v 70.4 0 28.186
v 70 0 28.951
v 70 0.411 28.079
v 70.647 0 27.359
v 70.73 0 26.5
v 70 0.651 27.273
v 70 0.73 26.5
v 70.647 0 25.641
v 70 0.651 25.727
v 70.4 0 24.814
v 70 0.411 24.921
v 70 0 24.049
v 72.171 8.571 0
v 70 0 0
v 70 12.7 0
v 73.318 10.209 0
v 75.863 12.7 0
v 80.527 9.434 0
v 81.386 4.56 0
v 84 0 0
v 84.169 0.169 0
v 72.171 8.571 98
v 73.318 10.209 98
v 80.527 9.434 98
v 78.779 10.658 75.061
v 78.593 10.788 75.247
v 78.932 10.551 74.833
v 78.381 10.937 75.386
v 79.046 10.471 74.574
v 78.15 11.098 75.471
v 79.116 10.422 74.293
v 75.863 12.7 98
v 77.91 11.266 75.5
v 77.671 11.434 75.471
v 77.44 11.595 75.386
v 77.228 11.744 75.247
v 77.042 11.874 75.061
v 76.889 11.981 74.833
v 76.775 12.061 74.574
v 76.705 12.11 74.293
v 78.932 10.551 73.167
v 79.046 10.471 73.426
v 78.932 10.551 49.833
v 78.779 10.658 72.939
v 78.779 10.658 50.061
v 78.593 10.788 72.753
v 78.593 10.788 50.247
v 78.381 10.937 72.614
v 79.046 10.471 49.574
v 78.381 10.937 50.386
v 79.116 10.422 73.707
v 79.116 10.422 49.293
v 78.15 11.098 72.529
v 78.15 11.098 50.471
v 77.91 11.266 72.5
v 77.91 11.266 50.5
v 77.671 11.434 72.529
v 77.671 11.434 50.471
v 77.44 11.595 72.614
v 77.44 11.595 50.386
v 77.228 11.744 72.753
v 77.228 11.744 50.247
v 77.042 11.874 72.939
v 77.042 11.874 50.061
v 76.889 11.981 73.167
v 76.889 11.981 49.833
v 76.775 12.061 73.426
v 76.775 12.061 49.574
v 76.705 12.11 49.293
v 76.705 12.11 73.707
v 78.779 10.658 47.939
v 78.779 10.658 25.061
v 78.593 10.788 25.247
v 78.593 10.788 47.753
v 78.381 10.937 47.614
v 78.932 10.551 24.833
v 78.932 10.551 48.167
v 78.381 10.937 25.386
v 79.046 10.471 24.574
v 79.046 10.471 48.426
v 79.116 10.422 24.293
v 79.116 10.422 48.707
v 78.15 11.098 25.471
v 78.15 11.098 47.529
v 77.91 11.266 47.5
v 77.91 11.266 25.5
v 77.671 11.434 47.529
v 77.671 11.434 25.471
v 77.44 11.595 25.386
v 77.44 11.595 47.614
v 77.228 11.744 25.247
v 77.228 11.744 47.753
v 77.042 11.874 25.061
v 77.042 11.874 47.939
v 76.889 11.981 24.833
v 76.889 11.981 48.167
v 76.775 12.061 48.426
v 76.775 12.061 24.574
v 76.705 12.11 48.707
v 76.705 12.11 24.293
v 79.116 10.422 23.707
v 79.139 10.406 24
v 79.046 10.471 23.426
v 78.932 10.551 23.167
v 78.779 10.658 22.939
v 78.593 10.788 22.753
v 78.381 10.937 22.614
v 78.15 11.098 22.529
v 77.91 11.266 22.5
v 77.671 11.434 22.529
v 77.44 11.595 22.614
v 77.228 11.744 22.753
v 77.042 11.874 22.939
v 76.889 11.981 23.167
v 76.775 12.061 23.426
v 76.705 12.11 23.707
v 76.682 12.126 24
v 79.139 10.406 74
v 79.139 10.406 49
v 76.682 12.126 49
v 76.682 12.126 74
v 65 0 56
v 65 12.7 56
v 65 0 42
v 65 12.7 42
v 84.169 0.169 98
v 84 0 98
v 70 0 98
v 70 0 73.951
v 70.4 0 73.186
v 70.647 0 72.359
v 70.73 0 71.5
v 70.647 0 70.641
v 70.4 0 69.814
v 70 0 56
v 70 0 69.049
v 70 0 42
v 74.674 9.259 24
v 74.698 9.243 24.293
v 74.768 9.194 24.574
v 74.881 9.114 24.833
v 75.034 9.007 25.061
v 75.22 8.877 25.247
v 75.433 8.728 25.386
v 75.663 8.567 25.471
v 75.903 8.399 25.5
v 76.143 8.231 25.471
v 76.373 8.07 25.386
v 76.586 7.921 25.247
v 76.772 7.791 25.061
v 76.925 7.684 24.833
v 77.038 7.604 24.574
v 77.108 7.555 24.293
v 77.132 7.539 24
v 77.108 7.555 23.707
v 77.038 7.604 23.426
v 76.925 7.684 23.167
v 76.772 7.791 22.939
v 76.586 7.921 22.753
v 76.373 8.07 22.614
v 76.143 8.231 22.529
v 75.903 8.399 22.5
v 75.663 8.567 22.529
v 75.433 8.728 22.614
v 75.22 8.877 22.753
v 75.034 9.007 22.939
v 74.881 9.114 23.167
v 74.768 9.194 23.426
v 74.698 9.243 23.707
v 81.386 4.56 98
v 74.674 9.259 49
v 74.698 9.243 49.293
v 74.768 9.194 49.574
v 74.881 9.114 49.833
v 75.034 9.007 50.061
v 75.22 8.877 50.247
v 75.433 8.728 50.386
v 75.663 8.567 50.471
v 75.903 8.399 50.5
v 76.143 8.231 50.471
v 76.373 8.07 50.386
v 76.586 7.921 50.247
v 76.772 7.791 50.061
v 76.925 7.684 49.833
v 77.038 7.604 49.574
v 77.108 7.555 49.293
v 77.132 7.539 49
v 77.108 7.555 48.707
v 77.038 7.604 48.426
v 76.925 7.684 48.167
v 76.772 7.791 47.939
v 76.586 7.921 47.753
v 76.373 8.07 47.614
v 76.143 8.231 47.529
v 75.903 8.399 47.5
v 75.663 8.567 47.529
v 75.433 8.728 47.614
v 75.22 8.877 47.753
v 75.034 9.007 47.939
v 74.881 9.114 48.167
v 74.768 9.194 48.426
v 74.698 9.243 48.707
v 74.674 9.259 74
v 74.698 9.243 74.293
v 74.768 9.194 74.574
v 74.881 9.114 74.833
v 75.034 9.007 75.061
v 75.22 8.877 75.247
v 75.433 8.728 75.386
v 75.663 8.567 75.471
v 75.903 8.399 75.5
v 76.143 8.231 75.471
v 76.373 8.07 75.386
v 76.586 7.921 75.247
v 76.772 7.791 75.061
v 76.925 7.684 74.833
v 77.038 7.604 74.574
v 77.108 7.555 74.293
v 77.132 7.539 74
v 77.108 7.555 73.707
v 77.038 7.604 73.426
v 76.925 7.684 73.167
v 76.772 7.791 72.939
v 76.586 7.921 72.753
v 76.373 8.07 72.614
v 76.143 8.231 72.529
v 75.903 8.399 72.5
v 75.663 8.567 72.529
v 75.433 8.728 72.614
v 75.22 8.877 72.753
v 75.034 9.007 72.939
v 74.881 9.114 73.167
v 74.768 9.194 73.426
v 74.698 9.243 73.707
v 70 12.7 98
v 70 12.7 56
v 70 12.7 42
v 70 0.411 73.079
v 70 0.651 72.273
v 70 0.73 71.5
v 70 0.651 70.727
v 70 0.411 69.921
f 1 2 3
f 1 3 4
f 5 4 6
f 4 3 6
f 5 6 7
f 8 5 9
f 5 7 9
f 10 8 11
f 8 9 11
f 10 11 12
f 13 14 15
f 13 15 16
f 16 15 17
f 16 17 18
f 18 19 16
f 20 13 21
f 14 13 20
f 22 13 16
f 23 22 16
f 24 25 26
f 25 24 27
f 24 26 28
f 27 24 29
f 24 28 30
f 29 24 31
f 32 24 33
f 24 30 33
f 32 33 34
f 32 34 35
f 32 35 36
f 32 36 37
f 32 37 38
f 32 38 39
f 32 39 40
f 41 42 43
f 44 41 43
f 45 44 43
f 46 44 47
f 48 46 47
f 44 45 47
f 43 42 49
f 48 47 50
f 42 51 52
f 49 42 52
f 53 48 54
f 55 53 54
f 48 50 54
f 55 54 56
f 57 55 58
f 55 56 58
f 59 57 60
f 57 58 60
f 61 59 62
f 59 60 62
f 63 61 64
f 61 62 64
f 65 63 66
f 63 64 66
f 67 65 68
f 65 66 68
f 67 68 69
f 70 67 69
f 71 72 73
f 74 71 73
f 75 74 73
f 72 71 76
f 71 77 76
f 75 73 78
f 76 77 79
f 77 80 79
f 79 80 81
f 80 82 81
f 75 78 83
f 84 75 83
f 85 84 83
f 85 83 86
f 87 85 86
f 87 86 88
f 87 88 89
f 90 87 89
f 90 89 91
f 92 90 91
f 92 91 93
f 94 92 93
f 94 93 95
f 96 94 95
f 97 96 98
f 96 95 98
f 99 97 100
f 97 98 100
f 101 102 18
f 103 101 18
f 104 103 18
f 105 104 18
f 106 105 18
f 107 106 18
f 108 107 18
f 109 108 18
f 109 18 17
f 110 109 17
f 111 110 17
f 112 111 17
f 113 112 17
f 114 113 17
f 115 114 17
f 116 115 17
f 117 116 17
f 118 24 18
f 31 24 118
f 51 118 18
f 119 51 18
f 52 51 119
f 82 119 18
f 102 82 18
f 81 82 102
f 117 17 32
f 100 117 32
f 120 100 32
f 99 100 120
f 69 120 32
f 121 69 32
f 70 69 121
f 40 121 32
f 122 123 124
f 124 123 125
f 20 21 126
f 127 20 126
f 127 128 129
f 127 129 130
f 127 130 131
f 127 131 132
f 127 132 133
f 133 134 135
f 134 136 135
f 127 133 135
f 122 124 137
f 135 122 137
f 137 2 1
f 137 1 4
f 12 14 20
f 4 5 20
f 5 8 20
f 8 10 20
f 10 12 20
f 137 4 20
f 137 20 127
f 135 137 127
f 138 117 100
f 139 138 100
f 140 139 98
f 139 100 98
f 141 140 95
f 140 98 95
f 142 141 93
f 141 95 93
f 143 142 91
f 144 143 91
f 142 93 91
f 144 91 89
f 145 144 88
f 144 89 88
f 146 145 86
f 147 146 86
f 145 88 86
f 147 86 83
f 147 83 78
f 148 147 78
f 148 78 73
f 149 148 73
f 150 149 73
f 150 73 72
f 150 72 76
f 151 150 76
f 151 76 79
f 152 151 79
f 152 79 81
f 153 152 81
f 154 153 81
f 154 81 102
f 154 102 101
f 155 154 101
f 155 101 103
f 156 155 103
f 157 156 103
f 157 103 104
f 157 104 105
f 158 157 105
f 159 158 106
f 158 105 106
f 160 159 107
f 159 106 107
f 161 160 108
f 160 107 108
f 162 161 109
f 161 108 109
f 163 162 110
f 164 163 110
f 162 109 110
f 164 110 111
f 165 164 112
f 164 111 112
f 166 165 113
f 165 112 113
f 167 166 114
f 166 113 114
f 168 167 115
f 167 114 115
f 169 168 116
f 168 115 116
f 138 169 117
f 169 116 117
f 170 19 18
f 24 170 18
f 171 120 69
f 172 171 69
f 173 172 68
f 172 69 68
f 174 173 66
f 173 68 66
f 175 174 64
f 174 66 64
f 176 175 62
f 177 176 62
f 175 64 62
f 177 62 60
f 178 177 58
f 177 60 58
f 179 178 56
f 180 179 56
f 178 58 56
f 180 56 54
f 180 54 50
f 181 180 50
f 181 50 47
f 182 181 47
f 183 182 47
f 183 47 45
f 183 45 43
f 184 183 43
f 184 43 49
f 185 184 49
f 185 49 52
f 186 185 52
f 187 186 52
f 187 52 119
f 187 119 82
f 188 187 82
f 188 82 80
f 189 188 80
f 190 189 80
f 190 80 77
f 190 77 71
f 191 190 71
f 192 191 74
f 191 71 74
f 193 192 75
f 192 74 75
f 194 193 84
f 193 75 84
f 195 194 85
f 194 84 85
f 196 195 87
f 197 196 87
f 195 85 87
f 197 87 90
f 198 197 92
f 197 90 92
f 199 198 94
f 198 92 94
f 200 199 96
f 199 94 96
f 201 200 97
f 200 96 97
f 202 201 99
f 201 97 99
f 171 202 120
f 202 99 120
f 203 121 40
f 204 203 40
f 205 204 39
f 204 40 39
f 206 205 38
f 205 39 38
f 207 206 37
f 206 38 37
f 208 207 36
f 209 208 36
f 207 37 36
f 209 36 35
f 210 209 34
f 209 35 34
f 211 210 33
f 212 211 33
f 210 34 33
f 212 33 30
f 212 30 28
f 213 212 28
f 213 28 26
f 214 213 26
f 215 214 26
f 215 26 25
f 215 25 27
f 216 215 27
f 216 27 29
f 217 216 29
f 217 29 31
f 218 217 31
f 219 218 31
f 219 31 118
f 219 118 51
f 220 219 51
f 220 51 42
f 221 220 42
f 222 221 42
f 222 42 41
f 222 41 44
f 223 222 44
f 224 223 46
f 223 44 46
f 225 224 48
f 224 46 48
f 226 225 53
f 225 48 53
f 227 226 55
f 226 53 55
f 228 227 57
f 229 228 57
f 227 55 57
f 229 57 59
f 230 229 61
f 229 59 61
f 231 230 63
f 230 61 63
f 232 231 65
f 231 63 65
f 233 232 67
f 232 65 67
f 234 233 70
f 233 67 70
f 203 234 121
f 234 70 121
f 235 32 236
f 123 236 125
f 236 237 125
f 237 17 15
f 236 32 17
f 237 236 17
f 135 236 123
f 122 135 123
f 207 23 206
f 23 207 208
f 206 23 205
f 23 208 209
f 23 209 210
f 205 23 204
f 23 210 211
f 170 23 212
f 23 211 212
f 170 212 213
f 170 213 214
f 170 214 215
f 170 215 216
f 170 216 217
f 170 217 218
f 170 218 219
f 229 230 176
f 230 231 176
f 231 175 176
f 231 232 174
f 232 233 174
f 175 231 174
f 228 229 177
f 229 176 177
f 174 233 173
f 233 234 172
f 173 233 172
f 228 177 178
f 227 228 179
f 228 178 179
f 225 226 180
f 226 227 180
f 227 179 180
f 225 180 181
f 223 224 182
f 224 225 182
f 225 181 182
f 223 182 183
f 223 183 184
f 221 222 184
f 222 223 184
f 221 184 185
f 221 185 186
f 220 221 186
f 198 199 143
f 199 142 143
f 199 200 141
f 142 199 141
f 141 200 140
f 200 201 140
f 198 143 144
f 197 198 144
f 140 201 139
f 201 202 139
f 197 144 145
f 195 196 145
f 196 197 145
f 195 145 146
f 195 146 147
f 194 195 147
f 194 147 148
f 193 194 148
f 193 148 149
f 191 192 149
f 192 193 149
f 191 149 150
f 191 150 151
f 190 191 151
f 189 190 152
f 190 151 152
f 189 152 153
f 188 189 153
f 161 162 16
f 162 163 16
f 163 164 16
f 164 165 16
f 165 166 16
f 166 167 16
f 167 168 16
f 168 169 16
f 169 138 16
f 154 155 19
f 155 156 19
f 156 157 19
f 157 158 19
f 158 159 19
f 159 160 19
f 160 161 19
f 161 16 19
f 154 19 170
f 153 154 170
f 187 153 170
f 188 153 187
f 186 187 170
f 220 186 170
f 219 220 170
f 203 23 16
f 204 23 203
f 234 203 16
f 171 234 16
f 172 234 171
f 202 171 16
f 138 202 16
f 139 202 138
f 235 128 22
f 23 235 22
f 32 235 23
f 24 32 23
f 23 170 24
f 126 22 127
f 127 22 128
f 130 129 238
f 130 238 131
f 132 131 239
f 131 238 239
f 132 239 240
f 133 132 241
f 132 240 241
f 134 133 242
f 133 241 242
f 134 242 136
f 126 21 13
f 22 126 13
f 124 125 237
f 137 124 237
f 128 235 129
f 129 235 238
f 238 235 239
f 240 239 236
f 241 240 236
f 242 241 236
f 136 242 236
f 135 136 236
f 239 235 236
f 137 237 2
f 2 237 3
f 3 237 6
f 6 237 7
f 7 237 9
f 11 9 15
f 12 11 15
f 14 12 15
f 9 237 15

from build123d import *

# Parameters (mm, degrees)
RESSALTO_EXTRUS_O1_DEPTH                            = 98
ESBO_O4_W                                           = 33
ESBO_O4_H                                           = 22
CORTE_EXTRUS_O3_DEPTH                               = 25
ESBO_O10_W                                          = 12
ESBO_O10_H                                          = 4
CORTE_EXTRUS_O8_DEPTH                               = 122.545423608
ESBO_O11_R                                          = 1.6
CORTE_EXTRUS_O9_DEPTH                               = 20
ESBO_O12_W                                          = 22
ESBO_O12_H                                          = 40
CORTE_EXTRUS_O10_DEPTH                              = 10
FILETE1_R                                           = 2.5
ESCAREADO_PARA_PARAFUSO_ALLEN_SEXTAVADO_D           = 4.3
ESCAREADO_PARA_PARAFUSO_ALLEN_SEXTAVADO_CSINK_D     = 8.96
ESCAREADO_PARA_PARAFUSO_ALLEN_SEXTAVADO_CSINK_ANGLE = 90
ESBO_O15_W                                          = 4
ESBO_O15_H                                          = 22
CORTE_EXTRUS_O11_DEPTH                              = 137.386546257
ESBO_O16_W                                          = 59.5
ESBO_O16_H                                          = 54
ESBO_O16_R                                          = 2.15
CORTE_EXTRUS_O12_DEPTH                              = 137.386546257
CHANFRO1_SIZE                                       = 10
CHANFRO1_SIZE2                                      = 7.180150431
CORTE_EXTRUS_O14_DEPTH                              = 102.622518505
CORTE_EXTRUS_O14_DEPTH_BACK                         = 102.622518505
CHANFRO2_SIZE                                       = 8
CHANFRO2_SIZE_2                                     = 9.267647445
CORTE_EXTRUS_O15_REACH                              = 121.956
ESBO_O19_R                                          = 1.5


with BuildPart() as part:
    # Esboço1 → Ressalto-extrusão1 (new body)
    with BuildSketch(Plane.XY):
        Polygon((0, 0), (94, 0), (75.862520314, 12.7), (0, 12.7), align=None)
    extrude(amount=RESSALTO_EXTRUS_O1_DEPTH)

    # Esboço4 → Corte-extrusão3 (cut)
    with BuildSketch(Plane(origin=(0, 12.7, 0), x_dir=(1, 0, 0), z_dir=(0, 1, 0))):
        with Locations((16.5, -87)):
            Rectangle(ESBO_O4_W, ESBO_O4_H)
        with Locations((16.5, -11)):
            Rectangle(ESBO_O4_W, ESBO_O4_H)
        with Locations((53.5, -87)):
            Rectangle(ESBO_O4_W, ESBO_O4_H)
        with Locations((53.5, -11)):
            Rectangle(ESBO_O4_W, ESBO_O4_H)
    extrude(amount=-CORTE_EXTRUS_O3_DEPTH, mode=Mode.SUBTRACT)

    # Esboço10 → Corte-extrusão8 (cut, through all)
    with BuildSketch(Plane.XY.offset(76)):
        with Locations((16.5, 10.7)):
            Rectangle(ESBO_O10_W, ESBO_O10_H)
        with Locations((53.5, 10.7)):
            Rectangle(ESBO_O10_W, ESBO_O10_H)
    extrude(amount=-CORTE_EXTRUS_O8_DEPTH, mode=Mode.SUBTRACT)

    # Esboço11 → Corte-extrusão9 (cut)
    with BuildSketch(Plane(origin=(0, 12.7, 0), x_dir=(1, 0, 0), z_dir=(0, 1, 0))):
        with Locations(Location((29.25, -26.5, 0), (0, 0, 180))):
            Circle(ESBO_O11_R)
        with Locations(Location((29.25, -71.5, 0), (0, 0, 180))):
            Circle(ESBO_O11_R)
        with Locations(Location((3.75, -71.5, 0), (0, 0, 180))):
            Circle(ESBO_O11_R)
        with Locations(Location((3.75, -26.5, 0), (0, 0, 180))):
            Circle(ESBO_O11_R)
        with Locations(Location((40.75, -26.5, 0), (0, 0, 180))):
            Circle(ESBO_O11_R)
        with Locations(Location((66.25, -26.5, 0), (0, 0, 180))):
            Circle(ESBO_O11_R)
        with Locations(Location((66.25, -71.5, 0), (0, 0, 180))):
            Circle(ESBO_O11_R)
        with Locations(Location((40.75, -71.5, 0), (0, 0, 180))):
            Circle(ESBO_O11_R)
    extrude(amount=-CORTE_EXTRUS_O9_DEPTH, mode=Mode.SUBTRACT)

    # Esboço12 → Corte-extrusão10 (cut)
    with BuildSketch(Plane(origin=(0, 12.7, 0), x_dir=(1, 0, 0), z_dir=(0, 1, 0))):
        with Locations((35, -49)):
            Rectangle(ESBO_O12_W, ESBO_O12_H)
    extrude(amount=-CORTE_EXTRUS_O10_DEPTH, mode=Mode.SUBTRACT)

    # Filete1
    filete1_edges = [part.edges().sort_by_distance(p)[0] for p in [
        (46, 7.7, 29),
        (46, 7.7, 69),
        (24, 7.7, 69),
        (24, 7.7, 29),
    ]]
    fillet(filete1_edges, radius=FILETE1_R)

    # Escareado para parafuso Allen sextavado escareado de M41 (through all)
    with Locations(Plane(origin=(0, 0, 0), x_dir=(-1, 0, 0), z_dir=(0, -1, 0))):
        with Locations((-66.25, -71.5), (-66.25, -26.5), (-40.75, -26.5), (-29.25, -26.5), (-29.25, -71.5), (-40.75, -71.5), (-3.75, -71.5), (-3.75, -26.5)):
            CounterSinkHole(ESCAREADO_PARA_PARAFUSO_ALLEN_SEXTAVADO_D / 2, ESCAREADO_PARA_PARAFUSO_ALLEN_SEXTAVADO_CSINK_D / 2, counter_sink_angle=ESCAREADO_PARA_PARAFUSO_ALLEN_SEXTAVADO_CSINK_ANGLE)

    # Esboço15 → Corte-extrusão11 (cut, through all)
    with BuildSketch(Plane(origin=(0, 12.7, 0), x_dir=(1, 0, 0), z_dir=(0, 1, 0))):
        with Locations((35, -11)):
            Rectangle(ESBO_O15_W, ESBO_O15_H)
        with Locations((35, -87)):
            Rectangle(ESBO_O15_W, ESBO_O15_H)
    extrude(amount=-CORTE_EXTRUS_O11_DEPTH, mode=Mode.SUBTRACT)

    # Esboço16 → Corte-extrusão12 (cut, through all)
    # profile 1 of 2: a face of its own
    with BuildSketch(Plane(origin=(0, 12.7, 0), x_dir=(1, 0, 0), z_dir=(0, 1, 0))):
        with Locations((29.75, -49)):
            Rectangle(ESBO_O16_W, ESBO_O16_H)
    # profile 2 of 2: a face of its own
    with BuildSketch(Plane(origin=(0, 12.7, 0), x_dir=(1, 0, 0), z_dir=(0, 1, 0))):
        Polygon((70, -42), (70, -22), (59.5, -22), (59.5, -76), (70, -76), (70, -56), (65, -56), (65, -42), align=None)
        with Locations((66.25, -71.5)):
            Circle(ESBO_O16_R, mode=Mode.SUBTRACT)
        with Locations((66.25, -26.5)):
            Circle(ESBO_O16_R, mode=Mode.SUBTRACT)
    extrude(amount=-CORTE_EXTRUS_O12_DEPTH, mode=Mode.SUBTRACT)

    # Chanfro1
    chanfro1_edges = [part.edges().sort_by_distance(p)[0] for p in [
        (94, 0, 49),
    ]]
    chanfro1_side = [part.faces().sort_by_distance(p)[0] for p in [
        (81.603595513, 0, 49),
    ]]
    chamfer(chanfro1_edges, length=CHANFRO1_SIZE, length2=CHANFRO1_SIZE2, reference=chanfro1_side[0])

    # Esboço18 → Corte-extrusão14 (cut, two sides: drawn at the far end of the back side and taken through both)
    with BuildSketch(Plane.XY.offset(49).offset(-CORTE_EXTRUS_O14_DEPTH_BACK)):
        Polygon((73.318031781, 10.208958991), (85.605312446, 1.605312446), (84.16928236, 0.16928236), (72.170878909, 8.570654902), align=None)
    extrude(amount=CORTE_EXTRUS_O14_DEPTH + CORTE_EXTRUS_O14_DEPTH_BACK, mode=Mode.SUBTRACT)

    # Chanfro2
    # the kernel refuses this chamfer: 9.267647445, 8 mm, written as the material it takes off along each edge
    with BuildSketch(Plane(origin=(88.118365096, 4.118365096, -23.833451274), x_dir=(-0.6804962674600086, -0.7327515472334374, 0), z_dir=(0, 0, 1))) as chanfro2_piece_1_section:
        Polygon((CHANFRO2_SIZE * 0.999317113267, -CHANFRO2_SIZE * 0.0369500626806), (CHANFRO2_SIZE_2 * 0.137140887434, -CHANFRO2_SIZE_2 * 0.990551551958), (0, 0), align=None)
    chanfro2_piece_1 = extrude(amount=145.666902548, mode=Mode.PRIVATE)
    chanfro2_piece_1 = split(chanfro2_piece_1, bisect_by=Plane(origin=(81.702068422, 1.896844157, 49), z_dir=(0.5735764363510464, 0.8191520442889916, 0)), keep=Keep.TOP, mode=Mode.PRIVATE)
    add(chanfro2_piece_1, mode=Mode.SUBTRACT)

    # Esboço19 → Corte-extrusão15 (cut, up to next)
    with BuildSketch(Plane(origin=(30.925053264, 44.165553177, 0), x_dir=(0.819152044288991, -0.5735764363510472, 0), z_dir=(0.5735764363510472, 0.819152044288991, 0)), mode=Mode.PRIVATE) as corte_extrus_o15_sk1:
        with Locations(Location((57.358517859, -74, 0), (0, 0, 180))):
            Circle(ESBO_O19_R)
    corte_extrus_o15_tool1 = extrude(corte_extrus_o15_sk1.sketch, amount=-CORTE_EXTRUS_O15_REACH, mode=Mode.PRIVATE) & part.part
    # Esboço19 → Corte-extrusão15 (cut, up to next)
    with BuildSketch(Plane(origin=(30.925053264, 44.165553177, 0), x_dir=(0.819152044288991, -0.5735764363510472, 0), z_dir=(0.5735764363510472, 0.819152044288991, 0)), mode=Mode.PRIVATE) as corte_extrus_o15_sk2:
        with Locations(Location((57.358517859, -49, 0), (0, 0, 180))):
            Circle(ESBO_O19_R)
    corte_extrus_o15_tool2 = extrude(corte_extrus_o15_sk2.sketch, amount=-CORTE_EXTRUS_O15_REACH, mode=Mode.PRIVATE) & part.part
    # Esboço19 → Corte-extrusão15 (cut, up to next)
    with BuildSketch(Plane(origin=(30.925053264, 44.165553177, 0), x_dir=(0.819152044288991, -0.5735764363510472, 0), z_dir=(0.5735764363510472, 0.819152044288991, 0)), mode=Mode.PRIVATE) as corte_extrus_o15_sk3:
        with Locations(Location((57.358517859, -24, 0), (0, 0, 180))):
            Circle(ESBO_O19_R)
    corte_extrus_o15_tool3 = extrude(corte_extrus_o15_sk3.sketch, amount=-CORTE_EXTRUS_O15_REACH, mode=Mode.PRIVATE) & part.part
    add(corte_extrus_o15_tool1.solids().sort_by_distance((77.9104, 11.266059, 74))[0], mode=Mode.SUBTRACT)
    add(corte_extrus_o15_tool2.solids().sort_by_distance((77.9104, 11.266059, 49))[0], mode=Mode.SUBTRACT)
    add(corte_extrus_o15_tool3.solids().sort_by_distance((77.9104, 11.266059, 24))[0], mode=Mode.SUBTRACT)


solid = part.part
